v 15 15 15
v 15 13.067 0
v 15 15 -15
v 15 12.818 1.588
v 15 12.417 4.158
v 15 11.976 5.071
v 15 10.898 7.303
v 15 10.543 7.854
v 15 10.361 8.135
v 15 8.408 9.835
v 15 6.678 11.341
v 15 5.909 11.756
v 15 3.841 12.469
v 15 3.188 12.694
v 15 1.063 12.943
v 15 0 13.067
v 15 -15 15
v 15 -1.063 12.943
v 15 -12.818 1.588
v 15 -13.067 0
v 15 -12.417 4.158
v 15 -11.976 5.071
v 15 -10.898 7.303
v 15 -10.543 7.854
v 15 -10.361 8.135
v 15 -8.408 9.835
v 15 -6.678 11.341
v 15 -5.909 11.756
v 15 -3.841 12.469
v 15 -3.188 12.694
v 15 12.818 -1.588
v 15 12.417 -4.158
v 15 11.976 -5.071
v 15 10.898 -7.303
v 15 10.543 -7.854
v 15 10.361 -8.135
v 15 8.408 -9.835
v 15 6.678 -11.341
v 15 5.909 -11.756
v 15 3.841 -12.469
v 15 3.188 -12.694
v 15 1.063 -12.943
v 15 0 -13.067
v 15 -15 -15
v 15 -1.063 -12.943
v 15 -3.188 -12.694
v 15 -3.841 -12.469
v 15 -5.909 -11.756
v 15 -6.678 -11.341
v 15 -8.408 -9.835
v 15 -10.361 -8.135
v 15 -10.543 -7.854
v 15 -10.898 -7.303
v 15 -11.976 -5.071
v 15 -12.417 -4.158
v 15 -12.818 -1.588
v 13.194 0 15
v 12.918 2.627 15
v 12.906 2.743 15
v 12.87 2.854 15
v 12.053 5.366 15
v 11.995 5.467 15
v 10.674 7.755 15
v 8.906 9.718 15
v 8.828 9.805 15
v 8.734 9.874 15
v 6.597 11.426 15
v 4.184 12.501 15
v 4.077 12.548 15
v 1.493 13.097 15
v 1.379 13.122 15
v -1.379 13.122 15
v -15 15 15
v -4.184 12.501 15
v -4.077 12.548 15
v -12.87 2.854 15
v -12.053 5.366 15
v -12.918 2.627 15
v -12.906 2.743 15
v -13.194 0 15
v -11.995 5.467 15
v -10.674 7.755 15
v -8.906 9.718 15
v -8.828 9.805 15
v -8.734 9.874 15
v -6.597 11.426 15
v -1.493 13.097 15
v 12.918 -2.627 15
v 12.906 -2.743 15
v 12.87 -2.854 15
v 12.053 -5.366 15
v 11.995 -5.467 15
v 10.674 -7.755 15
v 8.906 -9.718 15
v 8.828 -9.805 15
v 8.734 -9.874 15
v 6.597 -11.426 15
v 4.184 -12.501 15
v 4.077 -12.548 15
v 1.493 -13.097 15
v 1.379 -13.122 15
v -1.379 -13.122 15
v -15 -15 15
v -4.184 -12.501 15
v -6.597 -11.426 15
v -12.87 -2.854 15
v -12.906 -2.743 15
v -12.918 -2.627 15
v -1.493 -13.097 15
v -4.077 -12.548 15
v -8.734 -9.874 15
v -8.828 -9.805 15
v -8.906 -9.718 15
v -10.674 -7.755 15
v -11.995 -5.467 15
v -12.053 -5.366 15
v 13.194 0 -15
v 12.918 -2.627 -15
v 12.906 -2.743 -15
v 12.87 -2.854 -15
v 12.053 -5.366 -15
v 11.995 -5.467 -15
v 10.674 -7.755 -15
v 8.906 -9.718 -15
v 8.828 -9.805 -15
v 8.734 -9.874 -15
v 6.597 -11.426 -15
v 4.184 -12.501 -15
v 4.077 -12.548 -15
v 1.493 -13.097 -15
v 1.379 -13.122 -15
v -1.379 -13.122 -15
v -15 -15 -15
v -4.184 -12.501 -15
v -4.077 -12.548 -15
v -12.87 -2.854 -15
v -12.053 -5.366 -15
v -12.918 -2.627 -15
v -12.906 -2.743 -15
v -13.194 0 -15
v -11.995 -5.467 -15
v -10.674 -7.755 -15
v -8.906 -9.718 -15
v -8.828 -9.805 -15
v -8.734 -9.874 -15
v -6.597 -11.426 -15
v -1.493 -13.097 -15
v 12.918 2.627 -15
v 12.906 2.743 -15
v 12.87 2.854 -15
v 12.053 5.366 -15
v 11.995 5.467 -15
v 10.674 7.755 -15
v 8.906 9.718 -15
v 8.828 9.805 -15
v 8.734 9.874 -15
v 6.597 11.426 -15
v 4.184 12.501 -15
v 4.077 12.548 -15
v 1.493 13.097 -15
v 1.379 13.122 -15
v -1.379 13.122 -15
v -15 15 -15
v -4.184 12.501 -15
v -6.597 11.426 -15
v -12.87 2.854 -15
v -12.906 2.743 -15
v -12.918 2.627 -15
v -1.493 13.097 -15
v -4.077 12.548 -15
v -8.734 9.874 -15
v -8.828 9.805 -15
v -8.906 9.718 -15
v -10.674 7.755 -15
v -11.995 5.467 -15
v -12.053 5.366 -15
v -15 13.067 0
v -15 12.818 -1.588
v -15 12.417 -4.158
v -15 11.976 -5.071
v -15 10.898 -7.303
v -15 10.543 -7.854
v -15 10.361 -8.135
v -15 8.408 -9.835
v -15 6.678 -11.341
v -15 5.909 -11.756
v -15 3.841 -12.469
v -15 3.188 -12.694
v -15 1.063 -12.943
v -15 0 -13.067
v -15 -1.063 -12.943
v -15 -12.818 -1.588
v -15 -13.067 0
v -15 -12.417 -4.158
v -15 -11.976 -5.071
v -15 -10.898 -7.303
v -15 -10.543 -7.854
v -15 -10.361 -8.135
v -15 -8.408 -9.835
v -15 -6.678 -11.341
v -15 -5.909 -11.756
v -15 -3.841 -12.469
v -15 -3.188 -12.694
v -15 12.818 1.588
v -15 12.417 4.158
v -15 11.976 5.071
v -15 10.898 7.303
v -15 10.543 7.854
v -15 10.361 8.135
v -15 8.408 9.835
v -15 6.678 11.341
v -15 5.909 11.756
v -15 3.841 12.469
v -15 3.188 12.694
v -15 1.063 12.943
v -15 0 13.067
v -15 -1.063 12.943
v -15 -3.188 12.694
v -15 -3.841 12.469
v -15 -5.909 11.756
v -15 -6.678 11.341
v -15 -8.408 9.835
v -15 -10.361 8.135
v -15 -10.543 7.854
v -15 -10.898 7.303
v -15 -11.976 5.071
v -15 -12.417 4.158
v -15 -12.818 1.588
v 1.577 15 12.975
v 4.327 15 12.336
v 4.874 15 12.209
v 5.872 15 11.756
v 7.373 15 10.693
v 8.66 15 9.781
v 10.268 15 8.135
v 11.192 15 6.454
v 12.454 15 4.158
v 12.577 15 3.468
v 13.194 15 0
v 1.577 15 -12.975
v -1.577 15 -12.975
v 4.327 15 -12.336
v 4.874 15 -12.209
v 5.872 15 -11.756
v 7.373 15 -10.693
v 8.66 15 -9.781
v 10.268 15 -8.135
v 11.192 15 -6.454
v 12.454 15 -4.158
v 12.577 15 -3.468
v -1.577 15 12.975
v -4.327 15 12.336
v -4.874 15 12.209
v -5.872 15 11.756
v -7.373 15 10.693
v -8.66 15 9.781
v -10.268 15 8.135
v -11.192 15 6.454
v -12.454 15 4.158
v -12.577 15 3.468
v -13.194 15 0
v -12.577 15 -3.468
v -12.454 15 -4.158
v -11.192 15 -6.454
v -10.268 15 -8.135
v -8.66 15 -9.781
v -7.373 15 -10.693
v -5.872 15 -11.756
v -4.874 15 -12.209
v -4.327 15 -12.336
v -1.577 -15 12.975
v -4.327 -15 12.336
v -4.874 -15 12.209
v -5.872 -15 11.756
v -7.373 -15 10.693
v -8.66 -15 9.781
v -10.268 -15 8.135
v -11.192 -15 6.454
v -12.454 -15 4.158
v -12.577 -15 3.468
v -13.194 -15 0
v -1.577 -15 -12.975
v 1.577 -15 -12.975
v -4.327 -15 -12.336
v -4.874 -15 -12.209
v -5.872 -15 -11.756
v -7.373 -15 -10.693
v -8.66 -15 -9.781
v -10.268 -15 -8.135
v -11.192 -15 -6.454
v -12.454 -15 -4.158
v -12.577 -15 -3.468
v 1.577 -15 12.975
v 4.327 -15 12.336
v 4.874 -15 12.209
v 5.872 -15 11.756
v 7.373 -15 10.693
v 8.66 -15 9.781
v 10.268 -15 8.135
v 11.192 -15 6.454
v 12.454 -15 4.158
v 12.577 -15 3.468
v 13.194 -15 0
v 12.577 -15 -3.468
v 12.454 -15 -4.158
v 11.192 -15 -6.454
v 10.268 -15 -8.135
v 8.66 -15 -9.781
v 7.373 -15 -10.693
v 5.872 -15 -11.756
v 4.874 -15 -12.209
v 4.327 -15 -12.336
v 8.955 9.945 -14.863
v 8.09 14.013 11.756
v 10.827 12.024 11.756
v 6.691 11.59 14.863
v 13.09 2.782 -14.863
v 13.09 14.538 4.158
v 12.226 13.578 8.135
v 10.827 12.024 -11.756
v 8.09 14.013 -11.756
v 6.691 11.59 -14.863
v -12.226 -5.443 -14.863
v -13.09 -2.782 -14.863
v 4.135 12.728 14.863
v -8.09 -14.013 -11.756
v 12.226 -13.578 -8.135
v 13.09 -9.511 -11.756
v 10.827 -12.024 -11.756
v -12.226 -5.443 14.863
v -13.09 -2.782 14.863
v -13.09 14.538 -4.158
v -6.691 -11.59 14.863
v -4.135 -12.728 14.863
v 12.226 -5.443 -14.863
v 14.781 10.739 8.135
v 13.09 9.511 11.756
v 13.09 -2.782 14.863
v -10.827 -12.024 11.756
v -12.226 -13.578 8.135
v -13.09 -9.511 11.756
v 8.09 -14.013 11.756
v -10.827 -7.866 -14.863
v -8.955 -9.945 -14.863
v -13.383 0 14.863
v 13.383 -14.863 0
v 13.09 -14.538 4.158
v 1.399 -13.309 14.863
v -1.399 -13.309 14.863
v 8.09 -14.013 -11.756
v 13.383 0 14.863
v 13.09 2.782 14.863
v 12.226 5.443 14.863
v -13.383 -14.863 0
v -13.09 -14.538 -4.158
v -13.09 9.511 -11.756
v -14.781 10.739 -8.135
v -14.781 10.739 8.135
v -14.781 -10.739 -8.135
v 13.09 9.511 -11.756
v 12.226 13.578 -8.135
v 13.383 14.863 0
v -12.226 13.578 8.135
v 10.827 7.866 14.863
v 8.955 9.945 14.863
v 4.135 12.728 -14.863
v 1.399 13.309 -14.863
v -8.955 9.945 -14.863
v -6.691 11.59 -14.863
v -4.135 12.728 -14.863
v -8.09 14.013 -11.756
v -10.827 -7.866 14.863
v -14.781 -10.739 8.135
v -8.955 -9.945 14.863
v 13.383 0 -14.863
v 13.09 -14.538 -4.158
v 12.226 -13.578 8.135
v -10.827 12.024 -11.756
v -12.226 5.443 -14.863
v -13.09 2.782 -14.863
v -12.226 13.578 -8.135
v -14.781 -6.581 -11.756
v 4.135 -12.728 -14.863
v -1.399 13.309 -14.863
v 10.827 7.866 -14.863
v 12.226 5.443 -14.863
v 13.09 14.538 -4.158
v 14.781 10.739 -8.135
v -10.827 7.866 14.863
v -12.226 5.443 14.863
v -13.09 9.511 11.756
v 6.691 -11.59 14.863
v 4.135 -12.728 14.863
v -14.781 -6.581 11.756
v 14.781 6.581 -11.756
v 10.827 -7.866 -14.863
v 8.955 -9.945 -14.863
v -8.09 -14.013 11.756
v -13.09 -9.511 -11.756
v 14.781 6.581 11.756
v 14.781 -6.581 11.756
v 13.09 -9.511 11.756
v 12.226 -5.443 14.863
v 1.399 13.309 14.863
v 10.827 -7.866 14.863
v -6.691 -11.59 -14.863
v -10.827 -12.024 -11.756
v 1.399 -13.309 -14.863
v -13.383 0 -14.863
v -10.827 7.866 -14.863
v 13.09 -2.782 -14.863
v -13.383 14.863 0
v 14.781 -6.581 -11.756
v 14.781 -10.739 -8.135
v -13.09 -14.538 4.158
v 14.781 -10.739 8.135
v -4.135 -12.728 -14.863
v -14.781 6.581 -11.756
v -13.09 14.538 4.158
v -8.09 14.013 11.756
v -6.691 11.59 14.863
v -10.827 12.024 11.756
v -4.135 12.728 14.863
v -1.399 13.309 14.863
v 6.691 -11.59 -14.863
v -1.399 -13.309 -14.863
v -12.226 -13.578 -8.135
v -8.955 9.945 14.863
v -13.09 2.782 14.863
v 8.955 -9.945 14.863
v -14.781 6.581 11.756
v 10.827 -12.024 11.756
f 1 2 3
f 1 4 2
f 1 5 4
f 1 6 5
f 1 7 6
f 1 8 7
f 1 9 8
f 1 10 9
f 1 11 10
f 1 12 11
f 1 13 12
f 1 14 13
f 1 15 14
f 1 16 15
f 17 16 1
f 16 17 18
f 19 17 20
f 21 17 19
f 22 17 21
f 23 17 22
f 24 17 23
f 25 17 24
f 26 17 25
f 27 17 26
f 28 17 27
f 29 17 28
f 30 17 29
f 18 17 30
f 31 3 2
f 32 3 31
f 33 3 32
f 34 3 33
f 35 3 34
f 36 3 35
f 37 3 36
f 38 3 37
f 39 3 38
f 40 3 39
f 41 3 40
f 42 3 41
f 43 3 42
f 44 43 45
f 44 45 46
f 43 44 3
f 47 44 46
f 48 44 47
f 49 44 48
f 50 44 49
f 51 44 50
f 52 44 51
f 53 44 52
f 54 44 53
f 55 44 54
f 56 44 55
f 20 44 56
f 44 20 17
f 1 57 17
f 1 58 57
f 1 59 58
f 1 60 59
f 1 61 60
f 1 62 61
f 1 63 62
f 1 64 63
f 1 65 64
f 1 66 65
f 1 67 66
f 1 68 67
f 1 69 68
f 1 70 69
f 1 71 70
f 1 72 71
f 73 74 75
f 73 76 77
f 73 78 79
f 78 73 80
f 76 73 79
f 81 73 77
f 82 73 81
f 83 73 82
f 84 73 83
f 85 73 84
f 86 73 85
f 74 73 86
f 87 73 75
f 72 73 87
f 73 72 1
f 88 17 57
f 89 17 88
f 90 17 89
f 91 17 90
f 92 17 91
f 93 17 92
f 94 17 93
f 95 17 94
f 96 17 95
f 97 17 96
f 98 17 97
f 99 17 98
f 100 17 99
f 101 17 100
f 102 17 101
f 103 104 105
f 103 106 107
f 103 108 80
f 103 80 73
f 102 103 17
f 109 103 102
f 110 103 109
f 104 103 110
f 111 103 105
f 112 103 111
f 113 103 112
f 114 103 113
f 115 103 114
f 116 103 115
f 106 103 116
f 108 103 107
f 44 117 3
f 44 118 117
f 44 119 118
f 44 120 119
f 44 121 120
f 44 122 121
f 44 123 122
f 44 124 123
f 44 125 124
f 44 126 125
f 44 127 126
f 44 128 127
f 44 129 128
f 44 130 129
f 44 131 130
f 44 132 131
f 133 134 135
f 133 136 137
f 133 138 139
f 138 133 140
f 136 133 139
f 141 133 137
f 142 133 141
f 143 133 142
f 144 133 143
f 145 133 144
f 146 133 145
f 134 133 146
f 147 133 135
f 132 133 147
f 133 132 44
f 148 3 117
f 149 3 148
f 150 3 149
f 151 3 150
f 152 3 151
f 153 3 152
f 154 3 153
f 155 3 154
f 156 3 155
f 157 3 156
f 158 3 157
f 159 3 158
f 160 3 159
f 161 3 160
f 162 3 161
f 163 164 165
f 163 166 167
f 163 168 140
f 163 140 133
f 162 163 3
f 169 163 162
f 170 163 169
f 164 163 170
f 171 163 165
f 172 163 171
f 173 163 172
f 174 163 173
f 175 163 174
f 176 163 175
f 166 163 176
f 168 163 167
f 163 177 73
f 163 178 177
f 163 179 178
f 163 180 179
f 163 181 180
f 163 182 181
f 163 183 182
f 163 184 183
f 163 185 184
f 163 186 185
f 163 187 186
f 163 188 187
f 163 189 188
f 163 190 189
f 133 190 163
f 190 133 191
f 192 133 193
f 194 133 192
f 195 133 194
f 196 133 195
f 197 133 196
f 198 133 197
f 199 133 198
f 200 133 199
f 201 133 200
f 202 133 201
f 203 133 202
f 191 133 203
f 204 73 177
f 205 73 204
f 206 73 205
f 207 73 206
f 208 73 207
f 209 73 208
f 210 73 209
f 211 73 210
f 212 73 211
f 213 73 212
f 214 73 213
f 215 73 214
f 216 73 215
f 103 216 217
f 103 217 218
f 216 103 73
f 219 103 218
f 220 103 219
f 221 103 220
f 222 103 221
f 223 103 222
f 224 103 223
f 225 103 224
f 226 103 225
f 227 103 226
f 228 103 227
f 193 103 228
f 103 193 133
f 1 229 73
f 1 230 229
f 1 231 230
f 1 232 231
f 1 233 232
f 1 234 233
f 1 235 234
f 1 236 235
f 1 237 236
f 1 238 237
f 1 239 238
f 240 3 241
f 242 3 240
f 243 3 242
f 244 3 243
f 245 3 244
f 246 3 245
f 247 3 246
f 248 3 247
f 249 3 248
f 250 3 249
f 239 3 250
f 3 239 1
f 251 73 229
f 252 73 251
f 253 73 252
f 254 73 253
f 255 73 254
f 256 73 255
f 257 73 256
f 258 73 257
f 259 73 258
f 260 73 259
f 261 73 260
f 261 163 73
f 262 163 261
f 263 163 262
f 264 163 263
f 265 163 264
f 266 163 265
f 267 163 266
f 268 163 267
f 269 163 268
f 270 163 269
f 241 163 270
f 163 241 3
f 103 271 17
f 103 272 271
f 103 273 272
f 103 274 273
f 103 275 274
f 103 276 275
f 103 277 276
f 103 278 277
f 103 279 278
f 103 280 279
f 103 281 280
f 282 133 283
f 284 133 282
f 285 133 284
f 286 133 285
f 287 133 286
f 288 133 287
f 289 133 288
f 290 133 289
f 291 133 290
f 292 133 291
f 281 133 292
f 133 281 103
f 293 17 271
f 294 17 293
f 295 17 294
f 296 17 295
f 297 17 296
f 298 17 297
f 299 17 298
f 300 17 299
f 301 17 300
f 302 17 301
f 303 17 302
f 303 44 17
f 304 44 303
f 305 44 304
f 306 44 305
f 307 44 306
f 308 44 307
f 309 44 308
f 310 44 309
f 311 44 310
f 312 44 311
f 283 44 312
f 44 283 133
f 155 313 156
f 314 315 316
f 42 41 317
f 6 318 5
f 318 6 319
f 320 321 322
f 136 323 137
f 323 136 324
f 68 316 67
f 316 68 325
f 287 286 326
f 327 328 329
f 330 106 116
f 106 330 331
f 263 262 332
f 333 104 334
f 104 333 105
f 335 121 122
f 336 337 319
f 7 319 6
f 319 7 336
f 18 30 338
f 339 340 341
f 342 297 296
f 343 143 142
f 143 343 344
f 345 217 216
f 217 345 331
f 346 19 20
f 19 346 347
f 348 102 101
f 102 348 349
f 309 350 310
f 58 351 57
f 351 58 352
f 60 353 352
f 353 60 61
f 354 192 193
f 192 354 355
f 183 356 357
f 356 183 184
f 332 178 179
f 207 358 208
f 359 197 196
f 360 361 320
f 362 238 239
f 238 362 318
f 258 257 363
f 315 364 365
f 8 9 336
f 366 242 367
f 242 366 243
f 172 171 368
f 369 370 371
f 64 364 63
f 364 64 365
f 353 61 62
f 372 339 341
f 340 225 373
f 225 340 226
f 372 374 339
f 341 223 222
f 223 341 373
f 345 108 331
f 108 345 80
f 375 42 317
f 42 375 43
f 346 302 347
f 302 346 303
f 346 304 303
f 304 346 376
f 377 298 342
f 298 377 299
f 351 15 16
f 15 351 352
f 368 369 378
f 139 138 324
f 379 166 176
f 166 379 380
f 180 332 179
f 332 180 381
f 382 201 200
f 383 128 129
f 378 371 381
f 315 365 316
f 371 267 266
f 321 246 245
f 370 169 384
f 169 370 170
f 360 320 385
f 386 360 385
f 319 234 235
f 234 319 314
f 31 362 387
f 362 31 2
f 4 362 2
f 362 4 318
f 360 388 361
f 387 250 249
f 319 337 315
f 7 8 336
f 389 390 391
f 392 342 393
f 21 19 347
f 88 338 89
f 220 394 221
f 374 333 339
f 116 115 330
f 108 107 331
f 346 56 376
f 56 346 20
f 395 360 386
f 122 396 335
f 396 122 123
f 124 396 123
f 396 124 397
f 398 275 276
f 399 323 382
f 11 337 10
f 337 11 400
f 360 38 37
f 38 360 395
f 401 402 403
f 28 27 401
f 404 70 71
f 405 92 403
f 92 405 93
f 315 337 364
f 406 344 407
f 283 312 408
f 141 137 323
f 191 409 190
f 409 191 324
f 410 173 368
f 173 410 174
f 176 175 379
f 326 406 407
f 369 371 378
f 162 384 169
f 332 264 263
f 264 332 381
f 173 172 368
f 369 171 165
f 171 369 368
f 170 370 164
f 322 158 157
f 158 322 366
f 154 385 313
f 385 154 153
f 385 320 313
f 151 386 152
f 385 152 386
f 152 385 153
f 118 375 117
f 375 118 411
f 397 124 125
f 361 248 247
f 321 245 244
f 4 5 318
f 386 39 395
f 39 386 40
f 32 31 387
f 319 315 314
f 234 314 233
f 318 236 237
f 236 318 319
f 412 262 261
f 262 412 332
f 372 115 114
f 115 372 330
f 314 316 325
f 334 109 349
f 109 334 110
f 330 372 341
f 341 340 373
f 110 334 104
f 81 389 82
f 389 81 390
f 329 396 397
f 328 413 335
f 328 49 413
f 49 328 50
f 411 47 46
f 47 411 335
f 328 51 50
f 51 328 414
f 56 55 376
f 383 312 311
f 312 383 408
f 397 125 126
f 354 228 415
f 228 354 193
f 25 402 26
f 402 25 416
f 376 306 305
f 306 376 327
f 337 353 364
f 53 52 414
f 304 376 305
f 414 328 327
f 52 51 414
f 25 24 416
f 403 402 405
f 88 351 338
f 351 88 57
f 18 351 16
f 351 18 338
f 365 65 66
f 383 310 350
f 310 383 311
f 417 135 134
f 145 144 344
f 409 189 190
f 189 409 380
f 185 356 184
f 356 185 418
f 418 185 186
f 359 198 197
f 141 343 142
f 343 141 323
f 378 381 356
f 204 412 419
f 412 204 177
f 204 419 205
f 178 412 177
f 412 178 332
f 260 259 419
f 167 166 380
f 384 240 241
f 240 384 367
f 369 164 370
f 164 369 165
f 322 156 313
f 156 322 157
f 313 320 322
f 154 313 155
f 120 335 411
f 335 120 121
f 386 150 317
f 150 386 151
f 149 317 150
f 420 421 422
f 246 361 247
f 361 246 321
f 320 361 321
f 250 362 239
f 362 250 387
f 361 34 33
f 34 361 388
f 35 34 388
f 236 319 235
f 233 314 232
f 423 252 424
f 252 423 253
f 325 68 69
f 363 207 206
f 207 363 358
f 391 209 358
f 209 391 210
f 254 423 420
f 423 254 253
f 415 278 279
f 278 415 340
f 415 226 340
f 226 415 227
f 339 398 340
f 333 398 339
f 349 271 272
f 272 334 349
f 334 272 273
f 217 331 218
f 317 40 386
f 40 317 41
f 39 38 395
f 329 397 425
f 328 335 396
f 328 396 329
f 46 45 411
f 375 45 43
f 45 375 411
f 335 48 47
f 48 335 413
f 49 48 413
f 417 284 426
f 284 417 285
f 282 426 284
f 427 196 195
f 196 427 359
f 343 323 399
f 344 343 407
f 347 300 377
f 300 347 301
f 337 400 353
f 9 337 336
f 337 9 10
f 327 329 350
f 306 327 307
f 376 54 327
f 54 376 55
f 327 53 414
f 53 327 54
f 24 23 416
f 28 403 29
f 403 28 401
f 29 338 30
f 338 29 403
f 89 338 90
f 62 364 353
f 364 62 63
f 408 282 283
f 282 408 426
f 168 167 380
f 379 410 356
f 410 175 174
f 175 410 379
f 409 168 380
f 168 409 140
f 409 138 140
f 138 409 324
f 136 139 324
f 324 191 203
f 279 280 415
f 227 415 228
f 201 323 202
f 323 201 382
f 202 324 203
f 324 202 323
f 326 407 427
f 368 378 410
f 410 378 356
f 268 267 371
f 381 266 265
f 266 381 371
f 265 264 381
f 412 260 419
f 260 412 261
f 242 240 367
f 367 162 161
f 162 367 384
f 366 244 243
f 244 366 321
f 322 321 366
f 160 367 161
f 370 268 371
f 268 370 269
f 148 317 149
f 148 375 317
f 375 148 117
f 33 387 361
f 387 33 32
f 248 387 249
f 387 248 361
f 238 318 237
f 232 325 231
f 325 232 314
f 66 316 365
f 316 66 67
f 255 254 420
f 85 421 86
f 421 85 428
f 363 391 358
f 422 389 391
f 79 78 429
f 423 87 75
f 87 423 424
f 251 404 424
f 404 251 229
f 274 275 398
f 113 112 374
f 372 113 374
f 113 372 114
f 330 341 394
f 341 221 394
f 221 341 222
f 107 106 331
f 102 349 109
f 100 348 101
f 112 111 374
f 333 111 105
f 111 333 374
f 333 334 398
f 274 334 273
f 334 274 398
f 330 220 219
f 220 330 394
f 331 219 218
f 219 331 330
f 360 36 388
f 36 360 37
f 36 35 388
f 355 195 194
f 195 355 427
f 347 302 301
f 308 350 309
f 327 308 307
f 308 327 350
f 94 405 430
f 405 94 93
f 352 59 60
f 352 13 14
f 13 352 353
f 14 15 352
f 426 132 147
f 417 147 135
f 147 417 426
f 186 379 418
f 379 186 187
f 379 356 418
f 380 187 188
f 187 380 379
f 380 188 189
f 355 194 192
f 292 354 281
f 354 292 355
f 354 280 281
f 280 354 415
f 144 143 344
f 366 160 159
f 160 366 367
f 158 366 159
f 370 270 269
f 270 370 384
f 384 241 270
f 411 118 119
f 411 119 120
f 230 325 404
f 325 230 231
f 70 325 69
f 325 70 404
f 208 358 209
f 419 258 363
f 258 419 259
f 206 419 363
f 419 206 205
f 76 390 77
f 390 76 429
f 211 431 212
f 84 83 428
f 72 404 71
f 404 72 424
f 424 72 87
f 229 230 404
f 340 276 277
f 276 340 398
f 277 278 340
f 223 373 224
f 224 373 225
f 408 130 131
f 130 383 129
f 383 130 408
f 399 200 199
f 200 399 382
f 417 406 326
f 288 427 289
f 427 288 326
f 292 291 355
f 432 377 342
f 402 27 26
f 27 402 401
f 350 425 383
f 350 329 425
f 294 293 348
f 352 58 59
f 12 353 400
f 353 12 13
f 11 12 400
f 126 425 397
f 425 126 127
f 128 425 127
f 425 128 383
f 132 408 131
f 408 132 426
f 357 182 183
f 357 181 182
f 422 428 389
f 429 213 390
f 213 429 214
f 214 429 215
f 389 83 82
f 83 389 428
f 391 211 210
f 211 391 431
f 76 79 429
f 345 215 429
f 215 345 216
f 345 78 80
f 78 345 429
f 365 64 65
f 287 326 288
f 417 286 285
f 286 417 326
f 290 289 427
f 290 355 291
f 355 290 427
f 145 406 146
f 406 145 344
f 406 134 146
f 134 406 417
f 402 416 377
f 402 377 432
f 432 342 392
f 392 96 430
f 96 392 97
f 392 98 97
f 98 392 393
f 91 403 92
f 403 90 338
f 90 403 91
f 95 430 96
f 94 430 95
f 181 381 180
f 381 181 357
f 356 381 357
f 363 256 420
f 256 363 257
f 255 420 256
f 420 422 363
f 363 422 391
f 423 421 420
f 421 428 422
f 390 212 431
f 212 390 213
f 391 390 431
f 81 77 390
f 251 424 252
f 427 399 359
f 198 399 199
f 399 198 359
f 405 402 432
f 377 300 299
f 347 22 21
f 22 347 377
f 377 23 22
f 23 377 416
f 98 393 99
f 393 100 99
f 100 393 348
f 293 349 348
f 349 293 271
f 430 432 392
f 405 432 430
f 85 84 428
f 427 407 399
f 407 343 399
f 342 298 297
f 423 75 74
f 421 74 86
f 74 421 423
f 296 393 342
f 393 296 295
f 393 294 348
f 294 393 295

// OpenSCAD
module example2()
{
	difference() {
		cube(30, center = true);
		sphere(20);
	}
}

example2();
